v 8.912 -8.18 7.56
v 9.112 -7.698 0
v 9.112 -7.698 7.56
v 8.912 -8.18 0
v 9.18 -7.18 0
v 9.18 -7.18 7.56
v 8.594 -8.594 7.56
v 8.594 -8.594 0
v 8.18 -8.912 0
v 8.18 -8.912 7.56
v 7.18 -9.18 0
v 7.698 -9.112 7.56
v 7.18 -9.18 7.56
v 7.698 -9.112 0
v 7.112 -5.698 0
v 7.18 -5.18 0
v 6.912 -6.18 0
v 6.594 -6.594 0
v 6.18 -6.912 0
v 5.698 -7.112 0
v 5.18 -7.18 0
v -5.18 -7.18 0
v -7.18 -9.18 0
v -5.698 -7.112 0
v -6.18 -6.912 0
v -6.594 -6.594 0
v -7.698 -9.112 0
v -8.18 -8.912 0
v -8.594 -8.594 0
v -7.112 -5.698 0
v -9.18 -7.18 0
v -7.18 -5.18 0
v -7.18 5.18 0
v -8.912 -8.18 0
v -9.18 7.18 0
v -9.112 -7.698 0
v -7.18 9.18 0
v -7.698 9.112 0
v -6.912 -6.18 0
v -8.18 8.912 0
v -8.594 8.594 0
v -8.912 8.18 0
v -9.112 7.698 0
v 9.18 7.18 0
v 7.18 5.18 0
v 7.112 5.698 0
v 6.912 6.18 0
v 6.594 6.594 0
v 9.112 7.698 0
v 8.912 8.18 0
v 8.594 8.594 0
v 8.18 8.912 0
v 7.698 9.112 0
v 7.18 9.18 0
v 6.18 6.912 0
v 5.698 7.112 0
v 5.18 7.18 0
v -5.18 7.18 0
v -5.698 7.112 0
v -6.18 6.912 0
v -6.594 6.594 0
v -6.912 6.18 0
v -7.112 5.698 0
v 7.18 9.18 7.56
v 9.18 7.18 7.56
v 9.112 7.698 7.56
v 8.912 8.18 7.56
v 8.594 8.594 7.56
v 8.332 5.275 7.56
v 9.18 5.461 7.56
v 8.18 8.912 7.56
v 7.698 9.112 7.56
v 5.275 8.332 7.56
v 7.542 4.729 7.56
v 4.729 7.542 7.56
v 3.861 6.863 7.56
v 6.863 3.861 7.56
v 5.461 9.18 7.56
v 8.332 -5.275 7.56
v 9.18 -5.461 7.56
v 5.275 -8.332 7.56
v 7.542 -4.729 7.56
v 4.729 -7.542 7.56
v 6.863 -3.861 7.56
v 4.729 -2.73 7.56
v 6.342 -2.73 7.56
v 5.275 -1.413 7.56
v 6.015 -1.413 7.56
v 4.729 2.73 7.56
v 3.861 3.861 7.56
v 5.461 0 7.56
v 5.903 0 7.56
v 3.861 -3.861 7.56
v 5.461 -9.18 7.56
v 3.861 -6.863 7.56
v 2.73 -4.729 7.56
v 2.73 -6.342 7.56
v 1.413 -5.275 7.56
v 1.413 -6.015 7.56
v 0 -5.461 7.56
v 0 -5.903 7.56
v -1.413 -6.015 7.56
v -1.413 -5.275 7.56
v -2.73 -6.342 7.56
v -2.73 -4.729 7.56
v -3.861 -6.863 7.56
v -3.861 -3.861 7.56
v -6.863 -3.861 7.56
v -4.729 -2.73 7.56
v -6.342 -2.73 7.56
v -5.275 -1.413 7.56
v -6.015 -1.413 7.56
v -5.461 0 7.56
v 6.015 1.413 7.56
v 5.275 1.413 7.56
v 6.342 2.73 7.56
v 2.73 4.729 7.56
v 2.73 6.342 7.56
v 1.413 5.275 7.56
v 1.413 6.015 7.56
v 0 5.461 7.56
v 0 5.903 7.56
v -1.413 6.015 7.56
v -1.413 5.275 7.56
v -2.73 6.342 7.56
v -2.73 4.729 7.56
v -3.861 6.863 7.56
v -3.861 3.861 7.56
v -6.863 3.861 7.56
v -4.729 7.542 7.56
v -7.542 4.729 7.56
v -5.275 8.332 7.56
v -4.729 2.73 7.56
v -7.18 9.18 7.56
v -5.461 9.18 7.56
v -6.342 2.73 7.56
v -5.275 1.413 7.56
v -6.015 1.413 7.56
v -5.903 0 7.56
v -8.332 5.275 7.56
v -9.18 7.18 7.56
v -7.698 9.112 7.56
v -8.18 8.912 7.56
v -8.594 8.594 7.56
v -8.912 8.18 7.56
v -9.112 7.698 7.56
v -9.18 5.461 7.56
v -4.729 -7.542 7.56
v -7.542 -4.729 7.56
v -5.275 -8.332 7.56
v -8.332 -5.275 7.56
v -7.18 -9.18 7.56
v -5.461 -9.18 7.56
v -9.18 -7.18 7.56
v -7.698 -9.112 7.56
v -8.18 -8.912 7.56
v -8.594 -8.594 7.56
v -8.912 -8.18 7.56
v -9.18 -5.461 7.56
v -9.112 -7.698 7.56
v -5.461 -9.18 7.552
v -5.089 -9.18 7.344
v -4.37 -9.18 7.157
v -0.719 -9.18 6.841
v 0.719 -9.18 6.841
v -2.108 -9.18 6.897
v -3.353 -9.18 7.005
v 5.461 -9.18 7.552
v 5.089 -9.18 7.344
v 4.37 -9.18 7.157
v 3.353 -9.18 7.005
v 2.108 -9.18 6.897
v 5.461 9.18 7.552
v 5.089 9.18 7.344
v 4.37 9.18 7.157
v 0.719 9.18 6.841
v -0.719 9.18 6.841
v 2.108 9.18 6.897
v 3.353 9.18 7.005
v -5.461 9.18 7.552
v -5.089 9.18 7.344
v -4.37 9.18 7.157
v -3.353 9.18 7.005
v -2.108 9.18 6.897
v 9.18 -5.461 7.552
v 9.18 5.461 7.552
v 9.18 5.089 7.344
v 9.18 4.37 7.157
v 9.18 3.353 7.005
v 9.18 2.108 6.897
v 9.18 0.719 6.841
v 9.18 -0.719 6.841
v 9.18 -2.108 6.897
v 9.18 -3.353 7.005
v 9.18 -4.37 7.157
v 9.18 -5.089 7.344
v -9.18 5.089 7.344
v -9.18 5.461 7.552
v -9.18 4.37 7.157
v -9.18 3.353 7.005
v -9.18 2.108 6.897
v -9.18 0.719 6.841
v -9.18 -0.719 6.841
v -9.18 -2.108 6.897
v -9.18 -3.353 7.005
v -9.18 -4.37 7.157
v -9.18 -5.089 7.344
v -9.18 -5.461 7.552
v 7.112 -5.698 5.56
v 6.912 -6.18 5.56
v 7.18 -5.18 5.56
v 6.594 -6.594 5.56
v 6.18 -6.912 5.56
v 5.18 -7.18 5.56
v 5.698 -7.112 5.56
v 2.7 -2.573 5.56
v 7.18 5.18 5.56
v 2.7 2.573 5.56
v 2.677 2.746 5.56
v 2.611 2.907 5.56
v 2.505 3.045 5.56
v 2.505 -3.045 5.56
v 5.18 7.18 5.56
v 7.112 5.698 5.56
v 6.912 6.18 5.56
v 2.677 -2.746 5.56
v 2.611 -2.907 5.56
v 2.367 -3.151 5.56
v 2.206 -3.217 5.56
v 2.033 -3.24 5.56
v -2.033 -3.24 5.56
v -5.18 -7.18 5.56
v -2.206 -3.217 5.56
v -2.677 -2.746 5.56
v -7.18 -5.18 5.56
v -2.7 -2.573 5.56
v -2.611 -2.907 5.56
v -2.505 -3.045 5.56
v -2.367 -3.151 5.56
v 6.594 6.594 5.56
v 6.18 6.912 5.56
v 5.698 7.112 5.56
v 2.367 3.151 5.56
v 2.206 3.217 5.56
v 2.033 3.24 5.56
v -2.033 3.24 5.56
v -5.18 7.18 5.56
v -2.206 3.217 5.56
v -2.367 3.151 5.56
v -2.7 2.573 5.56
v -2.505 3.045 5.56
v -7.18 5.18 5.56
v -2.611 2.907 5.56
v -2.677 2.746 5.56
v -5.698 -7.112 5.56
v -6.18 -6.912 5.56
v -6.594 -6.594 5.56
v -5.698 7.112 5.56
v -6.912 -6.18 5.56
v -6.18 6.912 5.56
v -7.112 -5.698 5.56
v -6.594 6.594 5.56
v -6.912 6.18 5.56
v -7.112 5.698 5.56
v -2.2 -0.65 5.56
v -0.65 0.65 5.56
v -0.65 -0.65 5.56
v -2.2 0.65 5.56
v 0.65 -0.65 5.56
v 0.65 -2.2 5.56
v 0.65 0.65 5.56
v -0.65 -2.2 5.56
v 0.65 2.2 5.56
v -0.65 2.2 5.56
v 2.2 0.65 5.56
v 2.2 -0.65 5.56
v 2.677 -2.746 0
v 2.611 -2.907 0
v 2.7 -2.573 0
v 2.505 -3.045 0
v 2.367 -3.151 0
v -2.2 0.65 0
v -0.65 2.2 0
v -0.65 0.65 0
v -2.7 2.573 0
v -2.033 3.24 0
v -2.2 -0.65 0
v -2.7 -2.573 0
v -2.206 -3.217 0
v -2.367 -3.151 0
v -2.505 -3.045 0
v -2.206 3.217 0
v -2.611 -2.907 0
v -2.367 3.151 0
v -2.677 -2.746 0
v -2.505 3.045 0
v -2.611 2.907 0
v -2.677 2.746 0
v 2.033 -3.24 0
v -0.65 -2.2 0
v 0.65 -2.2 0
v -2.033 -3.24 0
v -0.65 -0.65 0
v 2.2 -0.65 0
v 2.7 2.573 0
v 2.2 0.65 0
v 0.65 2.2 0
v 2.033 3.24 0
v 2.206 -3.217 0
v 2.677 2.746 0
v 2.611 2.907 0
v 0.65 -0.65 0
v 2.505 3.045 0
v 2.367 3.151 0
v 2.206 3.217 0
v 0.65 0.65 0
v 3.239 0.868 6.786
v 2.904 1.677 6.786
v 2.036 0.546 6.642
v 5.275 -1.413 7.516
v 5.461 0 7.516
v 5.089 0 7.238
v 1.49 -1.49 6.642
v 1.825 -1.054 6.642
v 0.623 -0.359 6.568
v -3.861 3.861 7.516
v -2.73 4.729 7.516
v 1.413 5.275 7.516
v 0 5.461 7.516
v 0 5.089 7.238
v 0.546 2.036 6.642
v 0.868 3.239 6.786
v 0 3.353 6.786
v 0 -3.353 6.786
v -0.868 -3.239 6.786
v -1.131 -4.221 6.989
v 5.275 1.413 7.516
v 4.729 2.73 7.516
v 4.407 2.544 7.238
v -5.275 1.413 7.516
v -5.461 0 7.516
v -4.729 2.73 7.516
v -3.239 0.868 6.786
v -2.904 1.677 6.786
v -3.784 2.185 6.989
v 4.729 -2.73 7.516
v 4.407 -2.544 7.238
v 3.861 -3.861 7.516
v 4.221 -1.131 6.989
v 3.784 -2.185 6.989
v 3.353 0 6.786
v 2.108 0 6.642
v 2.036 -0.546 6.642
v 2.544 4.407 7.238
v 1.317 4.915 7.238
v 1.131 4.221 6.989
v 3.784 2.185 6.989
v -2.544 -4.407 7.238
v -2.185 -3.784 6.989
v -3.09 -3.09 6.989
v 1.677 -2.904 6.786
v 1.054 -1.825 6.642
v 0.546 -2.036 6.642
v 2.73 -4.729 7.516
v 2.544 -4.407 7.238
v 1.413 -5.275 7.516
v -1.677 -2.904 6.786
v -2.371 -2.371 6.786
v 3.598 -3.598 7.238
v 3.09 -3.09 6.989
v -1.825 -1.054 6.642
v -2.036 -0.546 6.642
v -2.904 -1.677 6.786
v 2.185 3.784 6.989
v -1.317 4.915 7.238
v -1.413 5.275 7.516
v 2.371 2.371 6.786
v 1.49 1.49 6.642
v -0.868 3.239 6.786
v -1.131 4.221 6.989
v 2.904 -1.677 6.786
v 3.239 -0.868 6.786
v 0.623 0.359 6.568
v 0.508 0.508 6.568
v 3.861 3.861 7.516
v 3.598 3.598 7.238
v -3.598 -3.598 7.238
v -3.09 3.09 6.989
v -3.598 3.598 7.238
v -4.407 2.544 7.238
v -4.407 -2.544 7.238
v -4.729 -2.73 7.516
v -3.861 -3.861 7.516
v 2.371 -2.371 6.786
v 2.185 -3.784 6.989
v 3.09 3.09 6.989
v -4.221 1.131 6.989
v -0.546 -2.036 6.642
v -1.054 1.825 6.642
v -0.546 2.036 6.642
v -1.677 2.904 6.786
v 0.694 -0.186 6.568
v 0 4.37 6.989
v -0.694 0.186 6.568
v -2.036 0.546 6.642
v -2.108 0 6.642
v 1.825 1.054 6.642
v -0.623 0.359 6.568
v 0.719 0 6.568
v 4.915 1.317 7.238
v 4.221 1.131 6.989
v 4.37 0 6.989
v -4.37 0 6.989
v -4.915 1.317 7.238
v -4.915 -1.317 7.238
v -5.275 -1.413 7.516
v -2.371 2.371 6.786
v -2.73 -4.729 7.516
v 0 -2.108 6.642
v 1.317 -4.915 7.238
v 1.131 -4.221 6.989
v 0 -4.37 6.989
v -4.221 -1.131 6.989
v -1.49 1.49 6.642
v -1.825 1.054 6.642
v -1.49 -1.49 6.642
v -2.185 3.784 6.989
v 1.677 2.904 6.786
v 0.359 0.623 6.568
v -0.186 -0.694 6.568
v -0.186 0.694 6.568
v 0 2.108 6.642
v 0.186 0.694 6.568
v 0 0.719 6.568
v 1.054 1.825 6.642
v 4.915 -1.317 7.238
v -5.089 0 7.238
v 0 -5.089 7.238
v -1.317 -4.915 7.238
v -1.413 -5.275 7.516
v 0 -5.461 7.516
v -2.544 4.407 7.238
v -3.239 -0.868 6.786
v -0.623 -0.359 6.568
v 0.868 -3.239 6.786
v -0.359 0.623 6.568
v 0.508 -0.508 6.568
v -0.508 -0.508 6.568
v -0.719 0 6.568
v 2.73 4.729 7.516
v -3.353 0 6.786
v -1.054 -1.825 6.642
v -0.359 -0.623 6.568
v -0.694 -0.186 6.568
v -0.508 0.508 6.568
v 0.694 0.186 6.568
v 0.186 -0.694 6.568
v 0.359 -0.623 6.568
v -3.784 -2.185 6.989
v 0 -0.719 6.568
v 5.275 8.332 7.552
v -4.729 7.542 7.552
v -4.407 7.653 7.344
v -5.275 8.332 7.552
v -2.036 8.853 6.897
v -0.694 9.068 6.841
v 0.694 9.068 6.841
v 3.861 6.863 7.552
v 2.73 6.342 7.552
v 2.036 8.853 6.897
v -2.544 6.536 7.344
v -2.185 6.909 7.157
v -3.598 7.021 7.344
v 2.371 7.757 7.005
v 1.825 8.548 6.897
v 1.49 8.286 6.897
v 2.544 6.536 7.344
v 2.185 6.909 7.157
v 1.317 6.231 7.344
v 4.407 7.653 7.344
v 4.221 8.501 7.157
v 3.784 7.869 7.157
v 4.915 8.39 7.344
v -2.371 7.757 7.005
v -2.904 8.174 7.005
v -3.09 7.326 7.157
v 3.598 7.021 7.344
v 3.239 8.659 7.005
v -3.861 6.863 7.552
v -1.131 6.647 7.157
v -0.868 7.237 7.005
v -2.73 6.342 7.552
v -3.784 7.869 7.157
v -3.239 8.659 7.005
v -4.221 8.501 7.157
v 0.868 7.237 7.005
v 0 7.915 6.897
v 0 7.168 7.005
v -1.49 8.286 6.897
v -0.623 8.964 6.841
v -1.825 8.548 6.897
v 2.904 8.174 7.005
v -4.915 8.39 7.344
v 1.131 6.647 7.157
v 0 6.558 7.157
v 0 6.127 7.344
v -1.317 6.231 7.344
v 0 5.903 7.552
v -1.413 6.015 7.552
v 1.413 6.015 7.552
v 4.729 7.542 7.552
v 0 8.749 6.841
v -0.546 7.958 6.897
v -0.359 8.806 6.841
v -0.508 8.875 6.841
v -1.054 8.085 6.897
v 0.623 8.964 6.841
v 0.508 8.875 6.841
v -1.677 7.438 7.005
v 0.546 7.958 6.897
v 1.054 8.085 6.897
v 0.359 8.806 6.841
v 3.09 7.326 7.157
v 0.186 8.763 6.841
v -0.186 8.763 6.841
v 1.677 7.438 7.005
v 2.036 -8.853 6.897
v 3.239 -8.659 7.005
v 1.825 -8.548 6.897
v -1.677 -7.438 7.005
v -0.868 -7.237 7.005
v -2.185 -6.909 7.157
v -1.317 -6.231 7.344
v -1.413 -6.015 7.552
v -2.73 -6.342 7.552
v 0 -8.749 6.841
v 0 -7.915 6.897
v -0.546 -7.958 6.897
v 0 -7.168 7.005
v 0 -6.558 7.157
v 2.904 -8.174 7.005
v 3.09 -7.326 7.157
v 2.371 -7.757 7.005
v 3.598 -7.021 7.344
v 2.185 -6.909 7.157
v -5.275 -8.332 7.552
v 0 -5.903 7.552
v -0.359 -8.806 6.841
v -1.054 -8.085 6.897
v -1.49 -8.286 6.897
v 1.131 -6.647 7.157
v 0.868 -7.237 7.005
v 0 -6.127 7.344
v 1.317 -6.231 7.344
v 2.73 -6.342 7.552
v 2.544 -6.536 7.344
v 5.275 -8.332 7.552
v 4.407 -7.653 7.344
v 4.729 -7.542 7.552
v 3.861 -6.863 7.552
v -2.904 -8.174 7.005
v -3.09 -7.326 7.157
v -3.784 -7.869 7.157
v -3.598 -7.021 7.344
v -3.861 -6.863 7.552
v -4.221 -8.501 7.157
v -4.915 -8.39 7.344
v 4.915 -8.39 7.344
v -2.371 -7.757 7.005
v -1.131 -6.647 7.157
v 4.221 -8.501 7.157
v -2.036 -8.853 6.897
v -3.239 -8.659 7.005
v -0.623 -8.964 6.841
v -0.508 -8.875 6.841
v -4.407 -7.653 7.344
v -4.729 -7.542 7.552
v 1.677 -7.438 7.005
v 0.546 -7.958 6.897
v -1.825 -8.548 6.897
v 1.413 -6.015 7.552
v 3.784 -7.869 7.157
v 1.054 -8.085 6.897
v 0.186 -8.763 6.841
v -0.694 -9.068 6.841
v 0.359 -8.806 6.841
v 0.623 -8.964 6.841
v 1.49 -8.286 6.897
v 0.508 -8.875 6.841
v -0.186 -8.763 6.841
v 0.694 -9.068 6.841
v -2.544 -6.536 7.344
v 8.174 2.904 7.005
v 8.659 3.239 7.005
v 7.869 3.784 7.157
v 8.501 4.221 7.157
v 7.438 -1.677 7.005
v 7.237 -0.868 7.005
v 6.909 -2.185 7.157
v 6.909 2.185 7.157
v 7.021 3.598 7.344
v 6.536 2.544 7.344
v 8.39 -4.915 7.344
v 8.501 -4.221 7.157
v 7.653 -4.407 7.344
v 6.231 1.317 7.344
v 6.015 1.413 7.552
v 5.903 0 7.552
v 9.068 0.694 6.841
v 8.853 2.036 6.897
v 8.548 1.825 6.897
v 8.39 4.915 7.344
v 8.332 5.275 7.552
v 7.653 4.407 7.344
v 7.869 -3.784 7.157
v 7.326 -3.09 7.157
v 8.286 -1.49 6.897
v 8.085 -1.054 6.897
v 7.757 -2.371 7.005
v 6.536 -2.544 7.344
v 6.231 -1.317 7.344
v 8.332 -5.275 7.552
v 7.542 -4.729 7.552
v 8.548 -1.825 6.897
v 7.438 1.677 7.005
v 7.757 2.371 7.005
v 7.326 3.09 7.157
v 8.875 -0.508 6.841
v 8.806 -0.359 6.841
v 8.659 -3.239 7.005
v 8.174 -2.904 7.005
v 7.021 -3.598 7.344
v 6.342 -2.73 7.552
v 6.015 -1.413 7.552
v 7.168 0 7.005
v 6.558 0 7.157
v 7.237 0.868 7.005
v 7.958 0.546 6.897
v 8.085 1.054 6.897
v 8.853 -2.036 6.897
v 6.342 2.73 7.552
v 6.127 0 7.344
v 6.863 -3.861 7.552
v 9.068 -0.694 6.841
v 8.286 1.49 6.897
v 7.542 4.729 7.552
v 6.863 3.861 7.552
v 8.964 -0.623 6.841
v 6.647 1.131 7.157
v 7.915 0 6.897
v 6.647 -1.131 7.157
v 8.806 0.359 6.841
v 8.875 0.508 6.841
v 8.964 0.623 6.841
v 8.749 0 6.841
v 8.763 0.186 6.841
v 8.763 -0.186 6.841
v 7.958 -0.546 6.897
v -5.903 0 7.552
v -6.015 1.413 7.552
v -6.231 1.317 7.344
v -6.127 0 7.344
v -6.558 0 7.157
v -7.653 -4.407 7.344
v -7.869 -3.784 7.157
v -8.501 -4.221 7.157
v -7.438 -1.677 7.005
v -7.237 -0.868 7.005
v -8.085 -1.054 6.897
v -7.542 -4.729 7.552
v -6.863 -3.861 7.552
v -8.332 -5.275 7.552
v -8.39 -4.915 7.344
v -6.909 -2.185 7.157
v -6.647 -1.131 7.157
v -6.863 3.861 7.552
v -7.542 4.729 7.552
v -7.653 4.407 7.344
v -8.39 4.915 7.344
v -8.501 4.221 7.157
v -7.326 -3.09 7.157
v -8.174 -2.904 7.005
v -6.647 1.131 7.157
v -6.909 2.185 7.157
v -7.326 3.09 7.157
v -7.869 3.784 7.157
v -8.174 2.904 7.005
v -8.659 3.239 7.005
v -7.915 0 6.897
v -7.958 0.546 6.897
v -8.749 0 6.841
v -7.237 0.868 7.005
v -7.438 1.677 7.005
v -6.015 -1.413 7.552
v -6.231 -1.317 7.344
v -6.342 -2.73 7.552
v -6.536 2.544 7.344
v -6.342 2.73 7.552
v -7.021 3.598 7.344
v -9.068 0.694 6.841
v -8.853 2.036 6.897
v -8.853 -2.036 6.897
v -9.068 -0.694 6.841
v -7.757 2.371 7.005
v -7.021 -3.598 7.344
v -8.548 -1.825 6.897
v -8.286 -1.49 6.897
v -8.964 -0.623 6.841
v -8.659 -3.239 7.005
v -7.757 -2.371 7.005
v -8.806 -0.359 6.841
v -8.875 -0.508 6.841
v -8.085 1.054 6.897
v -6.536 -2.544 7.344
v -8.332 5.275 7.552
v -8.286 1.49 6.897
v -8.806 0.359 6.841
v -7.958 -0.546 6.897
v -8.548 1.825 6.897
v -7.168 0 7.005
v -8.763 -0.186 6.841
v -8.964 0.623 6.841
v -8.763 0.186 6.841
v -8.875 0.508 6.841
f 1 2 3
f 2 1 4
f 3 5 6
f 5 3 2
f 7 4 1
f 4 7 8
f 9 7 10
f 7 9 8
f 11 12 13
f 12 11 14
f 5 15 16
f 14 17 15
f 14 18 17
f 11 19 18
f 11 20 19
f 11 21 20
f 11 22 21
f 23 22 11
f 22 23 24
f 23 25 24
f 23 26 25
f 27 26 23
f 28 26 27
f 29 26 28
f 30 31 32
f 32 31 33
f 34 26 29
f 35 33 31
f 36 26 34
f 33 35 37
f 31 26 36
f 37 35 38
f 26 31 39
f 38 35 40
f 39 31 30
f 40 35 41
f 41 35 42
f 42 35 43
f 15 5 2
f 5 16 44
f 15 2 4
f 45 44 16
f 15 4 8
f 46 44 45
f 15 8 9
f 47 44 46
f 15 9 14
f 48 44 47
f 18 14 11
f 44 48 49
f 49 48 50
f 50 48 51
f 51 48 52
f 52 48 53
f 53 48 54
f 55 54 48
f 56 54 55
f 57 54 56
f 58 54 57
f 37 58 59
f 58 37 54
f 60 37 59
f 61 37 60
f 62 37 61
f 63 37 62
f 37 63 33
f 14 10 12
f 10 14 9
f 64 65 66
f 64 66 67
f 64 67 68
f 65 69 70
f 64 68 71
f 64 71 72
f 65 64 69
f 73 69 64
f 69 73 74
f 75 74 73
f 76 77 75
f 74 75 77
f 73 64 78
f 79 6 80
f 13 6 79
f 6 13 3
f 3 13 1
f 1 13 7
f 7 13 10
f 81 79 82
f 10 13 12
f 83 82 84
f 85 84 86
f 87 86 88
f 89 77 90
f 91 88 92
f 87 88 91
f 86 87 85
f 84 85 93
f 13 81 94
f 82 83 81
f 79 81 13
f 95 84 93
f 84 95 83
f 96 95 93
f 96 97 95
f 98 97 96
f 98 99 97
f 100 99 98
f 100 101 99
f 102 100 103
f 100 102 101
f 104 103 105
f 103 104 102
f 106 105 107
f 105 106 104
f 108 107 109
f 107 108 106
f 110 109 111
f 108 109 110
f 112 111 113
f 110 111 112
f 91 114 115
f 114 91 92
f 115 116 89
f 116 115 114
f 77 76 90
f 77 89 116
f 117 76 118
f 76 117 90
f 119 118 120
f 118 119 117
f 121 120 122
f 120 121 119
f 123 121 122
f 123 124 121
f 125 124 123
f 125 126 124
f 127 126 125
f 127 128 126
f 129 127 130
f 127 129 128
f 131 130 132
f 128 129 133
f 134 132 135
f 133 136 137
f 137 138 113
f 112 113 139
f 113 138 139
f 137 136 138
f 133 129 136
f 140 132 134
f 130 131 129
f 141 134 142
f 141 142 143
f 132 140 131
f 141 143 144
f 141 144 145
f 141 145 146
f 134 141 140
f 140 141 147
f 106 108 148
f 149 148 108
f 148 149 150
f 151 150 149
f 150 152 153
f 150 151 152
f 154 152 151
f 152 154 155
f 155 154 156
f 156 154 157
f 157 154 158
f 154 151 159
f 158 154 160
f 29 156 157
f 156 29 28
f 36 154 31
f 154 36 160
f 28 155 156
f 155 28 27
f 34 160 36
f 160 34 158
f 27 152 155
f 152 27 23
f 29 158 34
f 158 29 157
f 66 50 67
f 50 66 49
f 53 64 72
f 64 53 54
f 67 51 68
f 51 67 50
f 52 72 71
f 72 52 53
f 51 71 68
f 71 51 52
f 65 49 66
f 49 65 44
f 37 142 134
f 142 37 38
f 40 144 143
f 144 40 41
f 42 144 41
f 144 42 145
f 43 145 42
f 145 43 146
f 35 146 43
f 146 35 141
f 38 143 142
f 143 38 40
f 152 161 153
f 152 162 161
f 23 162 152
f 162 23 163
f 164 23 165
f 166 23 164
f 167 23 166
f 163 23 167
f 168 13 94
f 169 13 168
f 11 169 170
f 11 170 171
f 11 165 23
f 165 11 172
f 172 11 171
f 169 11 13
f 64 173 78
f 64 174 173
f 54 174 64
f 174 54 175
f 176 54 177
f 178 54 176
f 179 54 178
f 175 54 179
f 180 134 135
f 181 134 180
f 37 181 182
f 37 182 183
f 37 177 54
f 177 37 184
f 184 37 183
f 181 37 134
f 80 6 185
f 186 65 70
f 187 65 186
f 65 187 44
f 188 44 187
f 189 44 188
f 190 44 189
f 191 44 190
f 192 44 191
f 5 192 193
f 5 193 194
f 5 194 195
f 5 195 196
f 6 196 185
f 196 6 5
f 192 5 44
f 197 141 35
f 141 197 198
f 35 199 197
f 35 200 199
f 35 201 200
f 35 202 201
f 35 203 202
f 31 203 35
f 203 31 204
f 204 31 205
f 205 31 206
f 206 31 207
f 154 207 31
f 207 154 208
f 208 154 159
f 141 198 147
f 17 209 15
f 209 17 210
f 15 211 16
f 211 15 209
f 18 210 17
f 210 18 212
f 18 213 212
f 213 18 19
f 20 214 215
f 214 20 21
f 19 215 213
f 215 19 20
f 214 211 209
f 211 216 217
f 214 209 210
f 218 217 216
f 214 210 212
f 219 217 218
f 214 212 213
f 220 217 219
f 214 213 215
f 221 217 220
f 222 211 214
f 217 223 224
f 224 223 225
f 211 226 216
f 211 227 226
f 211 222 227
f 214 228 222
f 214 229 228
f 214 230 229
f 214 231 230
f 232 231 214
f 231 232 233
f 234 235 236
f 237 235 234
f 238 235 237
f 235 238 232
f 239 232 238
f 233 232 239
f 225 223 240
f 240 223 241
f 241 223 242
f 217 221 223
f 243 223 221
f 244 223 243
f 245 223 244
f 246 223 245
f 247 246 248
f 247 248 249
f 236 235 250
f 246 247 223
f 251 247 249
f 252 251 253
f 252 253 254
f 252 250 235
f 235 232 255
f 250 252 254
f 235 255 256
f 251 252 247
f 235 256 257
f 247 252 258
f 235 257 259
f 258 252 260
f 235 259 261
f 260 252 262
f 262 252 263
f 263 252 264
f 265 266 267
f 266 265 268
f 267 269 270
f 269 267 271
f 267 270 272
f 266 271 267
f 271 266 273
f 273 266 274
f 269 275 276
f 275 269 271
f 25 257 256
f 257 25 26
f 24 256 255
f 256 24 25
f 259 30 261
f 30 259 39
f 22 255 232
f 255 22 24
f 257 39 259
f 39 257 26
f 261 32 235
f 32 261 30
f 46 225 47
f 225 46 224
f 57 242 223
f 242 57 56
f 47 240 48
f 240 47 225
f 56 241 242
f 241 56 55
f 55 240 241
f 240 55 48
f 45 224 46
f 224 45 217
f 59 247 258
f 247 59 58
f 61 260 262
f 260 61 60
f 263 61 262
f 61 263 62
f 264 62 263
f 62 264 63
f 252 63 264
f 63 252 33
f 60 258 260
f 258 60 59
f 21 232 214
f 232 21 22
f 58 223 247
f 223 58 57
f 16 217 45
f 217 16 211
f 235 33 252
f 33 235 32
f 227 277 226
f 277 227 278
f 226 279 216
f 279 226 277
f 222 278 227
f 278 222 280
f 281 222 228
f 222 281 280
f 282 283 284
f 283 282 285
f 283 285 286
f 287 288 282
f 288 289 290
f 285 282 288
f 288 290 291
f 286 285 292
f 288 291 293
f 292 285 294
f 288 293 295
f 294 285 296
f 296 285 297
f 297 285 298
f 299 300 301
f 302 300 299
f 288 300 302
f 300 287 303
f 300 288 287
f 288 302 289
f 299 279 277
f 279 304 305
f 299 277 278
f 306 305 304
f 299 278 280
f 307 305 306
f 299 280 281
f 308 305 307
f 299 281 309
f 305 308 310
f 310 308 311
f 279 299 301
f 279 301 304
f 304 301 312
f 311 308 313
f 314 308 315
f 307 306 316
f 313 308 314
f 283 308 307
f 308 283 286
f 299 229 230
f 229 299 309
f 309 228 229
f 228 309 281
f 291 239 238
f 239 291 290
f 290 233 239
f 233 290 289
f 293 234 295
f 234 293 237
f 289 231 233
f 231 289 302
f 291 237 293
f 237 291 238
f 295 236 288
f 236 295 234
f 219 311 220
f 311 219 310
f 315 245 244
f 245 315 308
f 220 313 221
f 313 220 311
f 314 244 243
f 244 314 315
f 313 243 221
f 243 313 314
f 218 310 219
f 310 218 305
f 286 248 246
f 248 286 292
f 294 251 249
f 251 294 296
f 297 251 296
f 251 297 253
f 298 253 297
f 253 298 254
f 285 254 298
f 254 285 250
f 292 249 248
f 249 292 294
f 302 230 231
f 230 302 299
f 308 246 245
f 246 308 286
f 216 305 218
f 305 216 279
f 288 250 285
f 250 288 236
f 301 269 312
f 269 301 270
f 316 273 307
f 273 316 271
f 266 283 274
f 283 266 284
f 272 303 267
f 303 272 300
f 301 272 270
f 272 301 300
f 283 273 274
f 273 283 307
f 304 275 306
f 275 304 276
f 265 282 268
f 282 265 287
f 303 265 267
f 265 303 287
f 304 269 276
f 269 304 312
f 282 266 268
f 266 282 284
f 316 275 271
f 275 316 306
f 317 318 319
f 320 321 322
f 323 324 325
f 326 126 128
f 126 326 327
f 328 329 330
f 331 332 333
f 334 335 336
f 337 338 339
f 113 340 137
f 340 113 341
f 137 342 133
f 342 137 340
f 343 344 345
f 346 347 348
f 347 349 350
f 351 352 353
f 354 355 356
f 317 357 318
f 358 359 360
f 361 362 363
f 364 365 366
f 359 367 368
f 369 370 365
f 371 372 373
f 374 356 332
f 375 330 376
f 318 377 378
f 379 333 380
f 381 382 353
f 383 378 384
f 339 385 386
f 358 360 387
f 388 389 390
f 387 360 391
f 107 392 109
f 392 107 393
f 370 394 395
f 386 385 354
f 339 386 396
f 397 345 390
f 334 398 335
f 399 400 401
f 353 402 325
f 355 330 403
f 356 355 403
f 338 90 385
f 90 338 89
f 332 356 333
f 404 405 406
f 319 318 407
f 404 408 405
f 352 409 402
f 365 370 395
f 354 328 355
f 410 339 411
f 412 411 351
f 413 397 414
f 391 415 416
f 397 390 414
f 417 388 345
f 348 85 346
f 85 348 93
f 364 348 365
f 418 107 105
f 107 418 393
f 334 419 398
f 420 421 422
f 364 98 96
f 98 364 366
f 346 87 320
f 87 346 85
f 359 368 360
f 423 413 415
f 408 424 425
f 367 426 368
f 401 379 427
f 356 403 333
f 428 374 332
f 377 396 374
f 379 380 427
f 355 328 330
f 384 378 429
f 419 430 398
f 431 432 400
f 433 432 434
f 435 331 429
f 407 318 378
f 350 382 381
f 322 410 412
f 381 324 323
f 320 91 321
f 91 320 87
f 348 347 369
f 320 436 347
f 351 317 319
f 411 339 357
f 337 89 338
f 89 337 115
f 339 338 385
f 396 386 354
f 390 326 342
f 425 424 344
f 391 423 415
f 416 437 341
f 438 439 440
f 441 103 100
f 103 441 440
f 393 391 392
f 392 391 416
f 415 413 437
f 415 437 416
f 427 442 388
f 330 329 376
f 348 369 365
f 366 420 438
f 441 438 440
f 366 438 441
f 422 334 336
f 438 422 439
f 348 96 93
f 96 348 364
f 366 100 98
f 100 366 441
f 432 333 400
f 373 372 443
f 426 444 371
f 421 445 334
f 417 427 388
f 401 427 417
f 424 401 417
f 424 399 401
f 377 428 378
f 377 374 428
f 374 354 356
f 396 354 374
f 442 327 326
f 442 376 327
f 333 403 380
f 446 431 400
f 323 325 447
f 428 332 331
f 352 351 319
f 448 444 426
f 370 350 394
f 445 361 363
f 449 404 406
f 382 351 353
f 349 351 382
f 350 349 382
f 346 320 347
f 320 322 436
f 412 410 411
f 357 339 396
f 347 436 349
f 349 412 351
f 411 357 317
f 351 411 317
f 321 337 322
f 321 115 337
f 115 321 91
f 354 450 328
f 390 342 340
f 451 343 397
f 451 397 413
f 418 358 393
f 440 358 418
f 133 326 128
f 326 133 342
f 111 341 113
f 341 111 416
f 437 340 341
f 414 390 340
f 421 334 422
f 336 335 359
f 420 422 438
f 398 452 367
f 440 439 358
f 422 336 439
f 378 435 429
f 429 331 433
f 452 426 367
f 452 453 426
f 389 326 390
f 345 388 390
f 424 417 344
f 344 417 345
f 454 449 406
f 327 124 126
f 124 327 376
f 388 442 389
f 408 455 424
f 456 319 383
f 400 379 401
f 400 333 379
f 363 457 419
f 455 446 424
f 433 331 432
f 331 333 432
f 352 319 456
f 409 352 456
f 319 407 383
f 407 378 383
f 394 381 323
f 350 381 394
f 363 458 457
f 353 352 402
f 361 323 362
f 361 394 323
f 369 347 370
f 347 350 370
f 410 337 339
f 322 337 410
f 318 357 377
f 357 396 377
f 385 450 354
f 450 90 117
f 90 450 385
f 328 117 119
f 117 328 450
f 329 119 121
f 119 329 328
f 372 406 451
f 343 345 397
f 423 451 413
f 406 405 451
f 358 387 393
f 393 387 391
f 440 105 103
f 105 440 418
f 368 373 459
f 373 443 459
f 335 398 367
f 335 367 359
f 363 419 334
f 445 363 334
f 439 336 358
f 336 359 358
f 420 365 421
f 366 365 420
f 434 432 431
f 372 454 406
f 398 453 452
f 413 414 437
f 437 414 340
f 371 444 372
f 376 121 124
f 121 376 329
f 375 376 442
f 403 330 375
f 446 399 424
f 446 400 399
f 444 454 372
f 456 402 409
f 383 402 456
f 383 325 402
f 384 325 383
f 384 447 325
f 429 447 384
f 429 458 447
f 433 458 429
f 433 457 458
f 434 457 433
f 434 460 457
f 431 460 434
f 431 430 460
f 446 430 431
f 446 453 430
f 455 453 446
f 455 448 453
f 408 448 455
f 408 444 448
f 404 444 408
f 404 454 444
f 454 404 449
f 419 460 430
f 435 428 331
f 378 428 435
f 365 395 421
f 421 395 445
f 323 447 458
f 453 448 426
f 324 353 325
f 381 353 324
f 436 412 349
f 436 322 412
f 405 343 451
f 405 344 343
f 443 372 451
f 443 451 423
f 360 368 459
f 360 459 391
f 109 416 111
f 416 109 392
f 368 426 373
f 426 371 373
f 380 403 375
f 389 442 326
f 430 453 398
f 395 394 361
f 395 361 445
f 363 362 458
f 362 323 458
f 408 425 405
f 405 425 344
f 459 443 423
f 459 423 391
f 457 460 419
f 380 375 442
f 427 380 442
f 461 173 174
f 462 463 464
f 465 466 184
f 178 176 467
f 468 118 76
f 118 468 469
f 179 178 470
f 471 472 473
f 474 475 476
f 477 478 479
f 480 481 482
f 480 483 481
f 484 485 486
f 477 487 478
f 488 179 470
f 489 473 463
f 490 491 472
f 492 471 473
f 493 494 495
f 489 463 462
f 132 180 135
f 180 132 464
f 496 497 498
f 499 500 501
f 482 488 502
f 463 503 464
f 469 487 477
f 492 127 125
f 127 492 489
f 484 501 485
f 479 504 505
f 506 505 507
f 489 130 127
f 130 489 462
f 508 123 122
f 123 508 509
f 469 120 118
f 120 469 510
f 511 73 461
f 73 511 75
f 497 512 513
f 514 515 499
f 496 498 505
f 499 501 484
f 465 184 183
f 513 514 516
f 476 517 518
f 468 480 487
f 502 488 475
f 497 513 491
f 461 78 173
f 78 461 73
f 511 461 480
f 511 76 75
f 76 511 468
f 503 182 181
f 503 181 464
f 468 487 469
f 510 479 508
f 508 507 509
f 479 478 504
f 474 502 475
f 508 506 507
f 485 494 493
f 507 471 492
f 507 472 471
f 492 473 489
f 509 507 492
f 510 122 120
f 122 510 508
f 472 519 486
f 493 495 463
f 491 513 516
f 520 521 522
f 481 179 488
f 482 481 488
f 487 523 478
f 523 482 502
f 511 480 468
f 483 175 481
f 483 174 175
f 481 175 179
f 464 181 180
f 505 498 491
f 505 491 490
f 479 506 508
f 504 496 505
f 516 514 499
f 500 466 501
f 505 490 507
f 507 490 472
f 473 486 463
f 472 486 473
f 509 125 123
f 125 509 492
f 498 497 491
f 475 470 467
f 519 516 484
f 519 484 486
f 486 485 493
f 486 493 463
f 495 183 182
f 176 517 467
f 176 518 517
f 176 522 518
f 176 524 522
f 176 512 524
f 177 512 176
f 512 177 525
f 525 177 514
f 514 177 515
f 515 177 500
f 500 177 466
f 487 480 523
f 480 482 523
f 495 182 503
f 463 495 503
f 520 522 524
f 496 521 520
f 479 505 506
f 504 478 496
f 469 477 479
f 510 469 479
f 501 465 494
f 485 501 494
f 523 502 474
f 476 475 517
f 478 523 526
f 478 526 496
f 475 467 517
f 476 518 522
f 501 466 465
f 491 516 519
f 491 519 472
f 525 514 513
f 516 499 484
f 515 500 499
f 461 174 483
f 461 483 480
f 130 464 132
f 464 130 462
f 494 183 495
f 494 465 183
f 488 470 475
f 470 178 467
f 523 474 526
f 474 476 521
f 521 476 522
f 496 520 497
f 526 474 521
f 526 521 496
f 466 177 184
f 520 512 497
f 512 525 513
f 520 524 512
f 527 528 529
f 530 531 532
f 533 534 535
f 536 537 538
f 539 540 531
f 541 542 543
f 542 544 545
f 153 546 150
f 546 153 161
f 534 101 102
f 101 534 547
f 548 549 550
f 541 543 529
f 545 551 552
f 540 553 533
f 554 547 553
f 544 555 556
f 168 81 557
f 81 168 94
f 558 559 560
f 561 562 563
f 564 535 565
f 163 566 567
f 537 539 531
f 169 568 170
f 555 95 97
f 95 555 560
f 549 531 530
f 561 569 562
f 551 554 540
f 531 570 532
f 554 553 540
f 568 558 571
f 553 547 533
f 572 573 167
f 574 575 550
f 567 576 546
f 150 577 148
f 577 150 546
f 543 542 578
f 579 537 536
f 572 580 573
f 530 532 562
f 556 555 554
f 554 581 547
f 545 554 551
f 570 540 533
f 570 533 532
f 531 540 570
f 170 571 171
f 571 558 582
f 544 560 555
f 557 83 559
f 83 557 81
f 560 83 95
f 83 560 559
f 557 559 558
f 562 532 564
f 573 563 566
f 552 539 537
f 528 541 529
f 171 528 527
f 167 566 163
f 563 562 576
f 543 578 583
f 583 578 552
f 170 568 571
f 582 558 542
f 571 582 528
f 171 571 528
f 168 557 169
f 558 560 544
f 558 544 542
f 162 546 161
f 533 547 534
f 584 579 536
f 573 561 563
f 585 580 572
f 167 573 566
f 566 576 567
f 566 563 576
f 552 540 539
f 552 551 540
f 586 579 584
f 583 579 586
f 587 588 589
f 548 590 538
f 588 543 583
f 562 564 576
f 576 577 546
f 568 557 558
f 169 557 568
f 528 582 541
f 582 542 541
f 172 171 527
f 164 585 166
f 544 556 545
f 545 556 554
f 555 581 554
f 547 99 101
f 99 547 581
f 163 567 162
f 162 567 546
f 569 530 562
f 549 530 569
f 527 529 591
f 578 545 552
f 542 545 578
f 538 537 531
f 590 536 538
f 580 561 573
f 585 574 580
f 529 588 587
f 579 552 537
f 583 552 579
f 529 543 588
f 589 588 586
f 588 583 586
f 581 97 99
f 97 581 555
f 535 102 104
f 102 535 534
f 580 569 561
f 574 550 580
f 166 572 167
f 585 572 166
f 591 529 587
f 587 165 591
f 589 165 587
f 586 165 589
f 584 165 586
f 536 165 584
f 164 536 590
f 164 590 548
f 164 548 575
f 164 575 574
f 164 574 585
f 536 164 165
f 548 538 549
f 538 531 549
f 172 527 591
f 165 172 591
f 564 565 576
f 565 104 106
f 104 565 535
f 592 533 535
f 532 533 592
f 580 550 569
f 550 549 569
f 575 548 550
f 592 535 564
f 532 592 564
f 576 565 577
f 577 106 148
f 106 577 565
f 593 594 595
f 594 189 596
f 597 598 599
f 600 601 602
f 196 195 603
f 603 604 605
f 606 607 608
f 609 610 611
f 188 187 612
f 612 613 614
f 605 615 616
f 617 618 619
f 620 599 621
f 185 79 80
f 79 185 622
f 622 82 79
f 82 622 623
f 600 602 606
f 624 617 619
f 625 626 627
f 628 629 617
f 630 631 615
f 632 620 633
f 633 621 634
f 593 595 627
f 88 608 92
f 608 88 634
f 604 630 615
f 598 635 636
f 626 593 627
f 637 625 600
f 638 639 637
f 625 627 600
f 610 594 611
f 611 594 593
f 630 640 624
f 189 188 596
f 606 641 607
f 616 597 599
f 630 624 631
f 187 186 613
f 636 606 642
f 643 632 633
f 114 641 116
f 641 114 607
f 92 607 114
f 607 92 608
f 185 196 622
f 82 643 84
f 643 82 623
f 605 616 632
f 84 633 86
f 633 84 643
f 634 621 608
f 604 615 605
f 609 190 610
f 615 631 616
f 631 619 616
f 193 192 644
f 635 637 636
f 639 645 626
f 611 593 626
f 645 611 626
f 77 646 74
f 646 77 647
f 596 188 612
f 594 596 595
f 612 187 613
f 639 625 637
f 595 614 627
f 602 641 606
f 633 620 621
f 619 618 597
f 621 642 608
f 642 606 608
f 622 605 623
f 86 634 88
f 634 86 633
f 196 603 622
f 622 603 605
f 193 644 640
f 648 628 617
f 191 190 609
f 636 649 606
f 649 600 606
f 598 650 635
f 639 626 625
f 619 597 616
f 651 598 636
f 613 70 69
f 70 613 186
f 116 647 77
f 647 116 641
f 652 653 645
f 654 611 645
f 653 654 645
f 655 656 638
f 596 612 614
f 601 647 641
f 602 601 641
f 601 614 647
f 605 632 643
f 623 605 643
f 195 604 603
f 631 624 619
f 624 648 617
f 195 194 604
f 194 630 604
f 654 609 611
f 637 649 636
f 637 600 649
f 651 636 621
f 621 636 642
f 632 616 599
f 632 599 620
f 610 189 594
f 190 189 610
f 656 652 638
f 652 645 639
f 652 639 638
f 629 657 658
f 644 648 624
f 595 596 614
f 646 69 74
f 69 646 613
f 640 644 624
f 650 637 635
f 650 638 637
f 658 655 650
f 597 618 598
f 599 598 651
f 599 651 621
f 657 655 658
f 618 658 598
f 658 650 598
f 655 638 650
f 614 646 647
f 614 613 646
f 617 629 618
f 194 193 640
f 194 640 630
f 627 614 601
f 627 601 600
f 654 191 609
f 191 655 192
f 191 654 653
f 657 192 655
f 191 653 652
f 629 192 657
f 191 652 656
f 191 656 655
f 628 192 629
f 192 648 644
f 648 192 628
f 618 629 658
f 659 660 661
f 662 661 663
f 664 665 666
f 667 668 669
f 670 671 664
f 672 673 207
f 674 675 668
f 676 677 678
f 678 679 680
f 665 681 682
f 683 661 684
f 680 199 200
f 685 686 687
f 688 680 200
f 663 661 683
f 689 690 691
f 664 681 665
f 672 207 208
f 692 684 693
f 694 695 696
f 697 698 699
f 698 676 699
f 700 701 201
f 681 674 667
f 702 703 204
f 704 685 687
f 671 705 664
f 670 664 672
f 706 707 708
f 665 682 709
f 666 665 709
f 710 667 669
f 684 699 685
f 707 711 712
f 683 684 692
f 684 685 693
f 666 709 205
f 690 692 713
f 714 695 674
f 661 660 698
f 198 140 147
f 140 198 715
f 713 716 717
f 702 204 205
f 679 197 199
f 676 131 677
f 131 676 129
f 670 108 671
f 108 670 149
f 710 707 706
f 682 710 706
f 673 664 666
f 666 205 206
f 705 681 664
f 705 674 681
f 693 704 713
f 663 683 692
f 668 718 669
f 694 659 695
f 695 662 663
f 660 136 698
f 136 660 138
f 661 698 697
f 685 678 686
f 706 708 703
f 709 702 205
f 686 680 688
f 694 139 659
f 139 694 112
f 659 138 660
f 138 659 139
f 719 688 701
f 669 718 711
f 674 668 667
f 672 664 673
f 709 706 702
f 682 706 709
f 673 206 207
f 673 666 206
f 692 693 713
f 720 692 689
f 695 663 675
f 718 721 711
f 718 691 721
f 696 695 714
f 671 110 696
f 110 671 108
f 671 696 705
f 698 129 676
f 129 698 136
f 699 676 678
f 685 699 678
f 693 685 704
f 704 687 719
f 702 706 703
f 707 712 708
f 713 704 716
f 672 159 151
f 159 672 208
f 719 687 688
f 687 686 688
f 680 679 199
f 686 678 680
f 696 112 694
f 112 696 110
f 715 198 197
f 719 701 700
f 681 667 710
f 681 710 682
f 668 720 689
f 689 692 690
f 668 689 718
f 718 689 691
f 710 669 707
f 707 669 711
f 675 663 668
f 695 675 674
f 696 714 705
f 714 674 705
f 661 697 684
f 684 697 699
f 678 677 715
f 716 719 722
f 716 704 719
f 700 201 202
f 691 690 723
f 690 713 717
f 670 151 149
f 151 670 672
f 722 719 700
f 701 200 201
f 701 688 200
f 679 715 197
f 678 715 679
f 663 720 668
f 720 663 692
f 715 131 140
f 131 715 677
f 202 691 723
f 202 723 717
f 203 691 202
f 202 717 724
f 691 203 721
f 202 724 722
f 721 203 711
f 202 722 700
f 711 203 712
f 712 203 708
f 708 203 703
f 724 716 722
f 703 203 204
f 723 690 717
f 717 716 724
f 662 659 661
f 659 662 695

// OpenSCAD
$fn = 24;

stem_wid = 5.4;
stem_radius = stem_wid / 2.0;
stem_high = 7.56;

corner_rv = 2.0;

// kepcap dimension
kc_width = 18.36;

// The (cutout) hole size
spoke_wid = 1.30;
spoke_len = 4.40;
spoke_height = 8.2;

module round_box(xv, yv, zv, center, rv) {
  width = xv;
  length = yv;
  height = zv;
  dx = (width - (rv * 2.0)) / 2.0;
  dy = (length - (rv * 2.0)) / 2.0;

  translate([dx, dy, 0]) cylinder(h=height, r1=rv, r2=rv, center=center);
  translate([-dx, dy, 0]) cylinder(h=height, r1=rv, r2=rv, center=center);
  translate([dx, -dy, 0]) cylinder(h=height, r1=rv, r2=rv, center=center);
  translate([-dx, -dy, 0]) cylinder(h=height, r1=rv, r2=rv, center=center);
  cube(size=[width - 2*rv, length, height], center=center);
  cube(size=[width, length-2*rv, height], center=center);
}

module keycap(nu, corner_rv) {
  center = true;
  union () {
    difference() {
      // keycap
      round_box(kc_width, kc_width * nu, stem_high, center, corner_rv);
      translate([0, 0, 2.0]) {
        round_box(kc_width - 4, kc_width * nu - 4, stem_high, center, corner_rv);
      }
    }

    // The stem
    dz = 0.4;
    translate([0, 0, dz / 2])
    difference() {
      round_box(stem_wid, stem_wid * 1.2, stem_high - dz, center, corner_rv / 3);
      union() {
        cube(size=[spoke_wid, spoke_len, spoke_height - dz], center=center);
        cube(size=[spoke_len, spoke_wid, spoke_height - dz], center=center);
      }
    }
  }
}

module letter(c) {
  rotate([180, 0, 90]) {
    translate([0, 0, -0.4])
      linear_extrude(height = 0.4) {
        text(c, size=8, font="Monaco:style=Regular", halign="center", valign="center");
    }};
}

module thumb_letter(c) {
  rotate([180, 0, 0]) {
    translate([0, 0, -0.4])
      linear_extrude(height = 0.4) {
        text(c, size=8, font="Monaco:style=Regular", halign="center", valign="center");
    }};
}

// translate([(kc_width + 4) * 0, 0, 0]) keycap(1.0);
// translate([(kc_width + 4) * 1, 0, 0]) keycap(1.5);
// translate([(kc_width + 4) * 2, 0, 0]) keycap(2.0);


module key(c) {
  difference() {
    translate([0, 0, stem_high / 2]) keycap(1, corner_rv);

    rotate([180, 0, 90]) {
      translate([0, 0, -0.4])
        linear_extrude(height = 0.41) {
          text(c, size=8, font="Monaco:style=Regular", halign="center", valign="center");
      }};
  }
}


module thumb_key(c, nu, corner_rv) {
  difference() {
    translate([0, 0, stem_high / 2]) keycap(nu, corner_rv);

    rotate([180, 0, 0]) {
      translate([0, 0, -0.4])
        linear_extrude(height = 0.41) {
          text(c, size=8, font="Monaco:style=Regular", halign="center", valign="center");
      }};
  }
}


// key("A");
// letter("A");

// thumb_key("U", 1.5, 3.0);
// thumb_letter("U");

// translate([0, 0, stem_high / 2]) keycap(1.5, corner_rv);

module dented_keycap() {
  difference() {
    translate([0, 0, stem_high/2.0])
      rotate([180, 0, 0]) keycap(1, corner_rv);

    union() {
      // dent in the middle
      translate([0, 0, stem_high + 0.10])
        scale([1, 1, 0.20]) sphere(r=kc_width * 0.3);

      // dents on the tips
      translate([0, kc_width/2.0, stem_high + 0.10])
        scale([1, 0.6, 0.15]) sphere(r=kc_width * 0.3);

      translate([0, -kc_width/2.0, stem_high + 0.10])
        scale([1, 0.6, 0.15]) sphere(r=kc_width * 0.3);

      translate([kc_width/2.0, 0, stem_high + 0.10])
        scale([0.6, 1, 0.15]) sphere(r=kc_width * 0.3);

      translate([-kc_width/2.0, 0, stem_high + 0.10])
        scale([0.6, 1, 0.15]) sphere(r=kc_width * 0.3);
    }
  }
}

dented_keycap();
